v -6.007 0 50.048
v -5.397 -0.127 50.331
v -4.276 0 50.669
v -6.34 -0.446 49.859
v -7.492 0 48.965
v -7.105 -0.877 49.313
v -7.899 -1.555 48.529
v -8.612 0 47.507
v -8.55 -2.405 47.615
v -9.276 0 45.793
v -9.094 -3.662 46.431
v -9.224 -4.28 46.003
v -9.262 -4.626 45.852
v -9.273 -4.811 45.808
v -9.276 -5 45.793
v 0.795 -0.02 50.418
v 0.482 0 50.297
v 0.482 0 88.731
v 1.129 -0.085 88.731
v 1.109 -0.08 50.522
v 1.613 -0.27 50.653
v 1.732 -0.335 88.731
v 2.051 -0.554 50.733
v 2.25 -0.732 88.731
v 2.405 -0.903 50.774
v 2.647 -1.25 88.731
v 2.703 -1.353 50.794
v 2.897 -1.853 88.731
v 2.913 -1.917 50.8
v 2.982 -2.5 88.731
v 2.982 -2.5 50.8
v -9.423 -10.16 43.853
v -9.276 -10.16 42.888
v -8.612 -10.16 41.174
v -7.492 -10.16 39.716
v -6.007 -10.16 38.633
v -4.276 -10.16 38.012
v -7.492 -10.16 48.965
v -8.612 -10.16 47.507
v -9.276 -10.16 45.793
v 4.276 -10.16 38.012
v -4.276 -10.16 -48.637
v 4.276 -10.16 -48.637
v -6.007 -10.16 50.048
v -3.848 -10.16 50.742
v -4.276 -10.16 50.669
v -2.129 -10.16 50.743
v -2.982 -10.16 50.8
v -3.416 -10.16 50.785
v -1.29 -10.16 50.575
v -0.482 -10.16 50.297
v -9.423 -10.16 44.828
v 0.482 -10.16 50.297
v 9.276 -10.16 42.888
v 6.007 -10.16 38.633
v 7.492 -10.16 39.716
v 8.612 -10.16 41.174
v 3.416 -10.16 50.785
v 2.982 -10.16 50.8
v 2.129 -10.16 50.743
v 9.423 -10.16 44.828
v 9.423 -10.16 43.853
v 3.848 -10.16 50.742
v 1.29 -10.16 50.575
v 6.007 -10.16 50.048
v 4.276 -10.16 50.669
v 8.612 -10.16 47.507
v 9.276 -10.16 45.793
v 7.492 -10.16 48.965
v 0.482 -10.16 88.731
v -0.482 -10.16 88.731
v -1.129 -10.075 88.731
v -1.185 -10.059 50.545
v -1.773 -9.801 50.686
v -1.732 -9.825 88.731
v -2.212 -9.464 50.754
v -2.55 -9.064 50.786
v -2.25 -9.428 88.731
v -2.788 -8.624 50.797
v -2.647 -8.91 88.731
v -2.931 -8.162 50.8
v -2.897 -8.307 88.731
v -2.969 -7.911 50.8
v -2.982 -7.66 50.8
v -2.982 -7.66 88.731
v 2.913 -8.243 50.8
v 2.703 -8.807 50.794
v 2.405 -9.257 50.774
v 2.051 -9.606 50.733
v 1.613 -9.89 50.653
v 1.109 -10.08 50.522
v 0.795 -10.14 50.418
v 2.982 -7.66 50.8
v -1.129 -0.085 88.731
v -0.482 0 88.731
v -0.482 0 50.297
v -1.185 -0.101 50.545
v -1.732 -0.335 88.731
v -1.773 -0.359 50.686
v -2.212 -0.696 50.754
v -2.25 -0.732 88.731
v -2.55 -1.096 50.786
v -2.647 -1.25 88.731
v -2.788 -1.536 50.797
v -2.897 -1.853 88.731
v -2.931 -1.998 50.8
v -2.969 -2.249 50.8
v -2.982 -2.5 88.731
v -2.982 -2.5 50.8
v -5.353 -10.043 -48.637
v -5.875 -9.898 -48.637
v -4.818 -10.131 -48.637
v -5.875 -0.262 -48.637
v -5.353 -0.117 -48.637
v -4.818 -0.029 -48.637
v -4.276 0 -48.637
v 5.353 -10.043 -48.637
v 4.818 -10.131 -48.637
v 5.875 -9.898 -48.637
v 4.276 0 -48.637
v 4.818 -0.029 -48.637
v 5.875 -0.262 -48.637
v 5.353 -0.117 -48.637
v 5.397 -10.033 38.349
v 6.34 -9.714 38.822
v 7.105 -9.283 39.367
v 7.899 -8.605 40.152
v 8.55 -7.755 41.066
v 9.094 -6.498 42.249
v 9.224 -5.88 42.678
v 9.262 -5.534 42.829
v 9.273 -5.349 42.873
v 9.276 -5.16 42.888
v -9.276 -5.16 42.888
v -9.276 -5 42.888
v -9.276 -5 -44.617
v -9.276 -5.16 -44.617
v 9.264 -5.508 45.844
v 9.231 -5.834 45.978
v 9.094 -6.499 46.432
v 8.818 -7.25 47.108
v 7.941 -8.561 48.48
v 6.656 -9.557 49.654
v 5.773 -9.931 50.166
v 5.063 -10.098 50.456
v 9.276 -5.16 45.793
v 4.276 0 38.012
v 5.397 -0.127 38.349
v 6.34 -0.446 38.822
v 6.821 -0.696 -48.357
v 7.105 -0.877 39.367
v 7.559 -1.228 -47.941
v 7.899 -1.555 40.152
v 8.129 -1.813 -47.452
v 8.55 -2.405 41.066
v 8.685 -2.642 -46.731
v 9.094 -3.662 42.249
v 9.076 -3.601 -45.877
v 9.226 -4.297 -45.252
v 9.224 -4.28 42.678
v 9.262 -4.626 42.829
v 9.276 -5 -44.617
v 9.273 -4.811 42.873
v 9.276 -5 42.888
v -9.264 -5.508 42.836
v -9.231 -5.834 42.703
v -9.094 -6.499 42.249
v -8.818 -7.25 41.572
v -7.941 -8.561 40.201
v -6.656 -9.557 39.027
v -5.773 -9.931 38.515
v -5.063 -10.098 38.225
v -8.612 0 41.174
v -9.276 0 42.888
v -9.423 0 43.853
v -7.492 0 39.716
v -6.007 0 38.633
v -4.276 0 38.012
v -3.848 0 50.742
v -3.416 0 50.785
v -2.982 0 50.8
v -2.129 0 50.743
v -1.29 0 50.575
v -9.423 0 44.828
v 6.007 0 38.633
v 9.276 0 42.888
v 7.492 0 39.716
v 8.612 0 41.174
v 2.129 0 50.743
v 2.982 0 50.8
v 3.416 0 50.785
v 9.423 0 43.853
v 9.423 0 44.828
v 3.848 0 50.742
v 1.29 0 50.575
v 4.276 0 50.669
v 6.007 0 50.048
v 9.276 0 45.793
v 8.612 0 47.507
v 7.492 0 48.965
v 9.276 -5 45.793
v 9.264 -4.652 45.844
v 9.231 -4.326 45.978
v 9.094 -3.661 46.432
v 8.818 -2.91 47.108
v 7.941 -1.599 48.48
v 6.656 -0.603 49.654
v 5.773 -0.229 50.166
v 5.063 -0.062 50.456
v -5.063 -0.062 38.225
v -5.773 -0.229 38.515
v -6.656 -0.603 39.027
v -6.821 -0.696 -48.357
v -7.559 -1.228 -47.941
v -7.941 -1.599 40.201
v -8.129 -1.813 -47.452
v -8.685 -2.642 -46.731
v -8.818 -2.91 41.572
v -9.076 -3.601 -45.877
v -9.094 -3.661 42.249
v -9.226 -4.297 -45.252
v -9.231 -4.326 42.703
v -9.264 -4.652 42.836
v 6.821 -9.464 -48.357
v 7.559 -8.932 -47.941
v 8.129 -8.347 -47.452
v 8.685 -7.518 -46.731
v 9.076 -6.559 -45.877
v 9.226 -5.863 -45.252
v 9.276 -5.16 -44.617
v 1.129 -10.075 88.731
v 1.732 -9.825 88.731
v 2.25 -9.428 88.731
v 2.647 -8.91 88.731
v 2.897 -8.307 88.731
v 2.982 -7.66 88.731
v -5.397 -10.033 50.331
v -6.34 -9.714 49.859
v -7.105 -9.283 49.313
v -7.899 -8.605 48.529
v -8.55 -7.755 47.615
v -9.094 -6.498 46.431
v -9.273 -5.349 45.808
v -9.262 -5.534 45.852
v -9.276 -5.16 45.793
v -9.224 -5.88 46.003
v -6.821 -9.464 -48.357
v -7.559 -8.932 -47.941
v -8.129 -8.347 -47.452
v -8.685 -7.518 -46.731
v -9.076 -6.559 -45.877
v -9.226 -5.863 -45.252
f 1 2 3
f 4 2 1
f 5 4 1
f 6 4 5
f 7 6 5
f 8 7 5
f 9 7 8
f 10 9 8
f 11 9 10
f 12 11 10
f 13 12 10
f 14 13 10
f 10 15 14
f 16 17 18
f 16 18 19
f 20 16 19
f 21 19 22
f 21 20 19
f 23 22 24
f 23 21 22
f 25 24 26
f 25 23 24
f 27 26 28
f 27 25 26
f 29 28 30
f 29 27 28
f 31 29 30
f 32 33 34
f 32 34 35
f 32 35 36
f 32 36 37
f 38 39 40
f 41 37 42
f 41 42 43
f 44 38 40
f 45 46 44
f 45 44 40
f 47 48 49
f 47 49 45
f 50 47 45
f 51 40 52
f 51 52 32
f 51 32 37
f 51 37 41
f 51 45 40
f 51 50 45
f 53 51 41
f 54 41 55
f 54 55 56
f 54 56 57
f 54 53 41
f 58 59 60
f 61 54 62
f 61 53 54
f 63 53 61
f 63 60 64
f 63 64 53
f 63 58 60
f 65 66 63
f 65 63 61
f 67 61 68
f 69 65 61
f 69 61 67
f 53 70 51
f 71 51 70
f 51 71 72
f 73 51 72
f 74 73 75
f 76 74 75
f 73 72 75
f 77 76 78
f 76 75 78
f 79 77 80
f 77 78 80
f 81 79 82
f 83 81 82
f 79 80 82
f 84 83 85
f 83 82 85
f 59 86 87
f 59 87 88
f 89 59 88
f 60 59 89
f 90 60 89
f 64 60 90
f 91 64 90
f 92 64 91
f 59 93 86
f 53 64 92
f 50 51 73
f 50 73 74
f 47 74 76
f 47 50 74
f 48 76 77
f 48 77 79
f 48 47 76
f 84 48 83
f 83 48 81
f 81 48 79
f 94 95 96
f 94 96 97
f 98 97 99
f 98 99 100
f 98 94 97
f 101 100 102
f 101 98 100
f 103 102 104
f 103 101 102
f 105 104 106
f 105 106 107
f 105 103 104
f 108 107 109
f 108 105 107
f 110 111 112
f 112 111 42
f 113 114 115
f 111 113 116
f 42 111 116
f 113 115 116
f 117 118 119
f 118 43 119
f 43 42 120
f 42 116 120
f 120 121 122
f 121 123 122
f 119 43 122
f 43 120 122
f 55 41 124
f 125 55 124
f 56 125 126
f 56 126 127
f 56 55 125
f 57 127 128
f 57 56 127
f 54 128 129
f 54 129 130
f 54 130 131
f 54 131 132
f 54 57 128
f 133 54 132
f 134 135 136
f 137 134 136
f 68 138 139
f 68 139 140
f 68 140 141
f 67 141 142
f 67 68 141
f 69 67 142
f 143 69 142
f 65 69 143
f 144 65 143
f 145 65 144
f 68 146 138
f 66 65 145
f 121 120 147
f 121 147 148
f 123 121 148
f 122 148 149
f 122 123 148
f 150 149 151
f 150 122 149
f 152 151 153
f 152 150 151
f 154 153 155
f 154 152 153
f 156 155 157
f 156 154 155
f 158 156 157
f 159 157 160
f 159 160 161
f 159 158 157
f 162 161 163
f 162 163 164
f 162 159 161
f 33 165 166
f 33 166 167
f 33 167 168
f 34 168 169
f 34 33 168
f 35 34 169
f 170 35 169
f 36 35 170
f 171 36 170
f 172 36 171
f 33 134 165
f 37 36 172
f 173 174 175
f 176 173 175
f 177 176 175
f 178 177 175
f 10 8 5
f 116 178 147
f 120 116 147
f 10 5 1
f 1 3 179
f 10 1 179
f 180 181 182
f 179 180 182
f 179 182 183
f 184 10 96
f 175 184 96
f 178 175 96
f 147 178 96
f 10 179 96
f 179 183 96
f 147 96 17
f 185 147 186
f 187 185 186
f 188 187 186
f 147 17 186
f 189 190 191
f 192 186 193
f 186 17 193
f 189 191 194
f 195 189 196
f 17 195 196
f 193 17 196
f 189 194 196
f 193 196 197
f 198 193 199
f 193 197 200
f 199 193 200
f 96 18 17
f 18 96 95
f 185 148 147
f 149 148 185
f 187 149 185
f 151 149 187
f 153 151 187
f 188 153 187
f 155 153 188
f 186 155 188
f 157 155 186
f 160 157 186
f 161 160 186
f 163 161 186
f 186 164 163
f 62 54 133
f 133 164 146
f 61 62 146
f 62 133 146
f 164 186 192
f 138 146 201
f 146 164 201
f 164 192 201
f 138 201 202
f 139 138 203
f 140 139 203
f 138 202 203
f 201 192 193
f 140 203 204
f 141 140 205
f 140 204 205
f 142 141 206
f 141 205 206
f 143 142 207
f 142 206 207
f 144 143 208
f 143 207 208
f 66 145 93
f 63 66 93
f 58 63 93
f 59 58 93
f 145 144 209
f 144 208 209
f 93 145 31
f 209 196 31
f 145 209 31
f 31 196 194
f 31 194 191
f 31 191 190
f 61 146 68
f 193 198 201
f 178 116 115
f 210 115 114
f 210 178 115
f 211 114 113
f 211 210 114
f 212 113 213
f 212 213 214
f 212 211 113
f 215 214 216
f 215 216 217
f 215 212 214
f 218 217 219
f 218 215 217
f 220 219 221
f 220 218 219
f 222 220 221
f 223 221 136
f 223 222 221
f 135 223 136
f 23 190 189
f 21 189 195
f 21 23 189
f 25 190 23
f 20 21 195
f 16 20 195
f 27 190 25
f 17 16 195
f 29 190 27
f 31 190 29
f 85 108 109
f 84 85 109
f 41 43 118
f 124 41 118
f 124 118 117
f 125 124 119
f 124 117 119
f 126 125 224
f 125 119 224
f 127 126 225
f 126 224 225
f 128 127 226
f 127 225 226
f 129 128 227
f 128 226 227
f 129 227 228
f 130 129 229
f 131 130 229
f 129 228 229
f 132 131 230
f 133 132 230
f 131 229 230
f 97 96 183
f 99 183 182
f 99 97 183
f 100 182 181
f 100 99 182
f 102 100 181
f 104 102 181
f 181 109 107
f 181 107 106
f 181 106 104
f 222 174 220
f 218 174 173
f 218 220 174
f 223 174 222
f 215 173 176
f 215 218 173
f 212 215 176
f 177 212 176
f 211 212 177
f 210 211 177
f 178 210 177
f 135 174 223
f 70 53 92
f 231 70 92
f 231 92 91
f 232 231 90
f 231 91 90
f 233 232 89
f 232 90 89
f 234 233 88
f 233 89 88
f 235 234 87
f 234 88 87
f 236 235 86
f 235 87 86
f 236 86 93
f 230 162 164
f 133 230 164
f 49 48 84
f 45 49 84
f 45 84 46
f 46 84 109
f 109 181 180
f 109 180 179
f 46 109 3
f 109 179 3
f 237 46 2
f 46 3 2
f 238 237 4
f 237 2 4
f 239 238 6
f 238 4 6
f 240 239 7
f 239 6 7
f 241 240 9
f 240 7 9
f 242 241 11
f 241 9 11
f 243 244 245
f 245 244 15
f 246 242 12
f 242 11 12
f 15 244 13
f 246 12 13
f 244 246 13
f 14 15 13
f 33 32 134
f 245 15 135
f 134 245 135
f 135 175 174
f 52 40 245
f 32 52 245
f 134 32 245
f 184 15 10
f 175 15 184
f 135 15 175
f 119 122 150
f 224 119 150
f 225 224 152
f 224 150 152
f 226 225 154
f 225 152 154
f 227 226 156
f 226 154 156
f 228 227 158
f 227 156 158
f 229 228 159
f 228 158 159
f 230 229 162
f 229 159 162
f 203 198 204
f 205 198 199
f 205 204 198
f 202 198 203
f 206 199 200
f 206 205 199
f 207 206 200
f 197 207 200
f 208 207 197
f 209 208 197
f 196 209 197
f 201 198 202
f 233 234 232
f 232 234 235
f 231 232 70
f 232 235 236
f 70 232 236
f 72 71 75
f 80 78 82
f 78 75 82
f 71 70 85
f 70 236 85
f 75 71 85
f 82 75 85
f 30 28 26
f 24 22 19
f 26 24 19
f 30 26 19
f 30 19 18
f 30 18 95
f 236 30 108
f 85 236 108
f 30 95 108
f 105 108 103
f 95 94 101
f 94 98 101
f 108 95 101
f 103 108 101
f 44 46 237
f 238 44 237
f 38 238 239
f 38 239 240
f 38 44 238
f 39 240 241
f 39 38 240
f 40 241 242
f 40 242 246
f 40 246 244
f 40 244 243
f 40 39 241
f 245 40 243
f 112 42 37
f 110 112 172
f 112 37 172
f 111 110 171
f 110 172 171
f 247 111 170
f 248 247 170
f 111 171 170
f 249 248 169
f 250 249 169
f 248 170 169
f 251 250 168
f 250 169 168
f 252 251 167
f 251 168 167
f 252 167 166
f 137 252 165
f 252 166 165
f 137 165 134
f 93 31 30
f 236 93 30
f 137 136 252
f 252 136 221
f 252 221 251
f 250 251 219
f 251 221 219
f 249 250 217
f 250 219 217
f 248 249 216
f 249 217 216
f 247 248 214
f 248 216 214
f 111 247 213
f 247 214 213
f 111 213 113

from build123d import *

# Parameters (mm, degrees)
F1_DEPTH     = 10.16
F2_T4_DEPTH  = 50.4313390776
F2_S5_R      = 6.4596874697
F2_T6_DEPTH  = 27
F2_T10_DEPTH = 50.4313390776
F2_S11_R     = 6.4596874697
F2_T12_DEPTH = 27
F2_T16_DEPTH = 50.4313390776
F2_S17_R     = 6.4596874697
F2_T18_DEPTH = 27
F2_T22_DEPTH = 50.4313390776
F2_S23_R     = 6.4596874697
F2_T24_DEPTH = 27
F3_T4_DEPTH  = 112.5049829483
F3_S5_R      = 6.4596874697
F3_T6_DEPTH  = 58
F3_T10_DEPTH = 112.5049829483
F3_S11_R     = 6.4596874697
F3_T12_DEPTH = 58
F3_T16_DEPTH = 112.5049829483
F3_S17_R     = 6.4596874697
F3_T18_DEPTH = 58
F3_T22_DEPTH = 112.5049829483
F3_S23_R     = 6.4596874697
F3_T24_DEPTH = 58


# Not quite as in the source:
# - a fillet or chamfer that OpenCascade refuses, or shapes differently, is made with other operations: its cross-section is extruded or revolved along the edge and cut away or added


with BuildPart() as f1:
    # F0 (on Front) → F1 (new body)
    with BuildSketch(Plane.XZ):
        with BuildLine():
            Line((-2.9818282316, 88.7313390776), (-2.9818282316, 50.8))
            ThreePointArc((-2.9818282316, 50.8), (-8.0369643669, 48.3618993886), (-9.2761479318, 42.8880378604))
            Line((-9.2761479318, 42.8880378604), (-9.2761479318, -44.6169450879))
            ThreePointArc((-9.2761479318, -44.6169450879), (-8.3117384594, -47.249729254), (-5.874895025, -48.6366078258))
            Line((-5.874895025, -48.6366078258), (0, -48.6366078258))
            Line((0, -48.6366078258), (5.874895025, -48.6366078258))
            ThreePointArc((5.874895025, -48.6366078258), (8.3117384594, -47.249729254), (9.2761479318, -44.6169450879))
            Line((9.2761479318, -44.6169450879), (9.2761479318, 42.8880378604))
            ThreePointArc((9.2761479318, 42.8880378604), (8.0369643669, 48.3618993886), (2.9818282316, 50.8))
            Line((2.9818282316, 50.8), (2.9818282316, 88.7313390776))
            Line((2.9818282316, 88.7313390776), (-2.9818282316, 88.7313390776))
        make_face()
    extrude(amount=F1_DEPTH)

    # F2: fillet of radius 2.5 on 4 edges, made by hand


with BuildPart() as f2_tool2:
    # F2_s3 → F2_t4 (new body)
    with BuildSketch(Plane.XY.offset(94.9813390776)):
        with BuildLine():
            ThreePointArc((-0.4818282316, 0), (-2.2495951845, -0.732233047), (-2.9818282316, -2.5))
            Line((-2.9818282316, -2.5), (-2.9818282316, 0))
            Line((-2.9818282316, 0), (-0.4818282316, 0))
        make_face()
    extrude(amount=-F2_T4_DEPTH)

    # F2_s5 → F2_t6 (cut, symmetric)
    with BuildSketch(Plane.XZ.offset(1.2)):
        with Locations((-2.9818282316, 44.3403125303)):
            Circle(F2_S5_R)
    extrude(amount=F2_T6_DEPTH, both=True, mode=Mode.SUBTRACT)


with BuildPart() as f1_1:
    add(f1.part)

    # F2_t1: cut F2_tool2
    add(f2_tool2.part, mode=Mode.SUBTRACT)


with BuildPart() as f2_tool8:
    # F2_s9 → F2_t10 (new body)
    with BuildSketch(Plane.XY.offset(44.55)):
        with BuildLine():
            ThreePointArc((0.4818282316, -10.16), (2.2495951845, -9.427766953), (2.9818282316, -7.66))
            Line((2.9818282316, -7.66), (2.9818282316, -10.16))
            Line((2.9818282316, -10.16), (0.4818282316, -10.16))
        make_face()
    extrude(amount=F2_T10_DEPTH)

    # F2_s11 → F2_t12 (cut, symmetric)
    with BuildSketch(Plane.XZ.offset(8.9)):
        with Locations((2.9818282316, 44.3403125303)):
            Circle(F2_S11_R)
    extrude(amount=F2_T12_DEPTH, both=True, mode=Mode.SUBTRACT)


with BuildPart() as f1_2:
    add(f1_1.part)

    # F2_t7: cut F2_tool8
    add(f2_tool8.part, mode=Mode.SUBTRACT)


with BuildPart() as f2_tool14:
    # F2_s15 → F2_t16 (new body)
    with BuildSketch(Plane.XY.offset(94.9813390776)):
        with BuildLine():
            ThreePointArc((-0.4818282316, -10.16), (-2.2495951845, -9.427766953), (-2.9818282316, -7.66))
            Line((-2.9818282316, -7.66), (-2.9818282316, -10.16))
            Line((-2.9818282316, -10.16), (-0.4818282316, -10.16))
        make_face()
    extrude(amount=-F2_T16_DEPTH)

    # F2_s17 → F2_t18 (cut, symmetric)
    with BuildSketch(Plane.XZ.offset(8.9)):
        with Locations((-2.9818282316, 44.3403125303)):
            Circle(F2_S17_R)
    extrude(amount=F2_T18_DEPTH, both=True, mode=Mode.SUBTRACT)


with BuildPart() as f1_3:
    add(f1_2.part)

    # F2_t13: cut F2_tool14
    add(f2_tool14.part, mode=Mode.SUBTRACT)


with BuildPart() as f2_tool20:
    # F2_s21 → F2_t22 (new body)
    with BuildSketch(Plane.XY.offset(44.55)):
        with BuildLine():
            ThreePointArc((0.4818282316, 0), (2.2495951845, -0.732233047), (2.9818282316, -2.5))
            Line((2.9818282316, -2.5), (2.9818282316, 0))
            Line((2.9818282316, 0), (0.4818282316, 0))
        make_face()
    extrude(amount=F2_T22_DEPTH)

    # F2_s23 → F2_t24 (cut, symmetric)
    with BuildSketch(Plane.XZ.offset(1.2)):
        with Locations((2.9818282316, 44.3403125303)):
            Circle(F2_S23_R)
    extrude(amount=F2_T24_DEPTH, both=True, mode=Mode.SUBTRACT)


with BuildPart() as f1_4:
    add(f1_3.part)

    # F2_t19: cut F2_tool20
    add(f2_tool20.part, mode=Mode.SUBTRACT)

    # F3: fillet of radius 5 on 4 edges, made by hand


with BuildPart() as f3_tool2:
    # F3_s3 → F3_t4 (new body)
    with BuildSketch(Plane.XY.offset(55.3880378604)):
        with BuildLine():
            ThreePointArc((-4.2761479318, 0), (-7.8116818377, -1.4644660941), (-9.2761479318, -5))
            Line((-9.2761479318, -5), (-9.2761479318, 0))
            Line((-9.2761479318, 0), (-4.2761479318, 0))
        make_face()
    extrude(amount=-F3_T4_DEPTH)

    # F3_s5 → F3_t6 (cut, symmetric)
    with BuildSketch(Plane.XZ.offset(2.5)):
        with Locations((-2.9818282316, 44.3403125303)):
            Circle(F3_S5_R)
    extrude(amount=F3_T6_DEPTH, both=True, mode=Mode.SUBTRACT)


with BuildPart() as f1_5:
    add(f1_4.part)

    # F3_t1: cut F3_tool2
    add(f3_tool2.part, mode=Mode.SUBTRACT)


with BuildPart() as f3_tool8:
    # F3_s9 → F3_t10 (new body)
    with BuildSketch(Plane.XY.offset(-57.1169450879)):
        with BuildLine():
            ThreePointArc((4.2761479318, 0), (7.8116818377, -1.4644660941), (9.2761479318, -5))
            Line((9.2761479318, -5), (9.2761479318, 0))
            Line((9.2761479318, 0), (4.2761479318, 0))
        make_face()
    extrude(amount=F3_T10_DEPTH)

    # F3_s11 → F3_t12 (cut, symmetric)
    with BuildSketch(Plane.XZ.offset(2.5)):
        with Locations((2.9818282316, 44.3403125303)):
            Circle(F3_S11_R)
    extrude(amount=F3_T12_DEPTH, both=True, mode=Mode.SUBTRACT)


with BuildPart() as f1_6:
    add(f1_5.part)

    # F3_t7: cut F3_tool8
    add(f3_tool8.part, mode=Mode.SUBTRACT)


with BuildPart() as f3_tool14:
    # F3_s15 → F3_t16 (new body)
    with BuildSketch(Plane.XY.offset(55.3880378604)):
        with BuildLine():
            ThreePointArc((-4.2761479318, -10.16), (-7.8116818377, -8.6955339059), (-9.2761479318, -5.16))
            Line((-9.2761479318, -5.16), (-9.2761479318, -10.16))
            Line((-9.2761479318, -10.16), (-4.2761479318, -10.16))
        make_face()
    extrude(amount=-F3_T16_DEPTH)

    # F3_s17 → F3_t18 (cut, symmetric)
    with BuildSketch(Plane.XZ.offset(7.7)):
        with Locations((-2.9818282316, 44.3403125303)):
            Circle(F3_S17_R)
    extrude(amount=F3_T18_DEPTH, both=True, mode=Mode.SUBTRACT)


with BuildPart() as f1_7:
    add(f1_6.part)

    # F3_t13: cut F3_tool14
    add(f3_tool14.part, mode=Mode.SUBTRACT)


with BuildPart() as f3_tool20:
    # F3_s21 → F3_t22 (new body)
    with BuildSketch(Plane.XY.offset(-57.1169450879)):
        with BuildLine():
            ThreePointArc((4.2761479318, -10.16), (7.8116818377, -8.6955339059), (9.2761479318, -5.16))
            Line((9.2761479318, -5.16), (9.2761479318, -10.16))
            Line((9.2761479318, -10.16), (4.2761479318, -10.16))
        make_face()
    extrude(amount=F3_T22_DEPTH)

    # F3_s23 → F3_t24 (cut, symmetric)
    with BuildSketch(Plane.XZ.offset(7.7)):
        with Locations((2.9818282316, 44.3403125303)):
            Circle(F3_S23_R)
    extrude(amount=F3_T24_DEPTH, both=True, mode=Mode.SUBTRACT)


with BuildPart() as f1_8:
    add(f1_7.part)

    # F3_t19: cut F3_tool20
    add(f3_tool20.part, mode=Mode.SUBTRACT)


solid = f1_8.part
